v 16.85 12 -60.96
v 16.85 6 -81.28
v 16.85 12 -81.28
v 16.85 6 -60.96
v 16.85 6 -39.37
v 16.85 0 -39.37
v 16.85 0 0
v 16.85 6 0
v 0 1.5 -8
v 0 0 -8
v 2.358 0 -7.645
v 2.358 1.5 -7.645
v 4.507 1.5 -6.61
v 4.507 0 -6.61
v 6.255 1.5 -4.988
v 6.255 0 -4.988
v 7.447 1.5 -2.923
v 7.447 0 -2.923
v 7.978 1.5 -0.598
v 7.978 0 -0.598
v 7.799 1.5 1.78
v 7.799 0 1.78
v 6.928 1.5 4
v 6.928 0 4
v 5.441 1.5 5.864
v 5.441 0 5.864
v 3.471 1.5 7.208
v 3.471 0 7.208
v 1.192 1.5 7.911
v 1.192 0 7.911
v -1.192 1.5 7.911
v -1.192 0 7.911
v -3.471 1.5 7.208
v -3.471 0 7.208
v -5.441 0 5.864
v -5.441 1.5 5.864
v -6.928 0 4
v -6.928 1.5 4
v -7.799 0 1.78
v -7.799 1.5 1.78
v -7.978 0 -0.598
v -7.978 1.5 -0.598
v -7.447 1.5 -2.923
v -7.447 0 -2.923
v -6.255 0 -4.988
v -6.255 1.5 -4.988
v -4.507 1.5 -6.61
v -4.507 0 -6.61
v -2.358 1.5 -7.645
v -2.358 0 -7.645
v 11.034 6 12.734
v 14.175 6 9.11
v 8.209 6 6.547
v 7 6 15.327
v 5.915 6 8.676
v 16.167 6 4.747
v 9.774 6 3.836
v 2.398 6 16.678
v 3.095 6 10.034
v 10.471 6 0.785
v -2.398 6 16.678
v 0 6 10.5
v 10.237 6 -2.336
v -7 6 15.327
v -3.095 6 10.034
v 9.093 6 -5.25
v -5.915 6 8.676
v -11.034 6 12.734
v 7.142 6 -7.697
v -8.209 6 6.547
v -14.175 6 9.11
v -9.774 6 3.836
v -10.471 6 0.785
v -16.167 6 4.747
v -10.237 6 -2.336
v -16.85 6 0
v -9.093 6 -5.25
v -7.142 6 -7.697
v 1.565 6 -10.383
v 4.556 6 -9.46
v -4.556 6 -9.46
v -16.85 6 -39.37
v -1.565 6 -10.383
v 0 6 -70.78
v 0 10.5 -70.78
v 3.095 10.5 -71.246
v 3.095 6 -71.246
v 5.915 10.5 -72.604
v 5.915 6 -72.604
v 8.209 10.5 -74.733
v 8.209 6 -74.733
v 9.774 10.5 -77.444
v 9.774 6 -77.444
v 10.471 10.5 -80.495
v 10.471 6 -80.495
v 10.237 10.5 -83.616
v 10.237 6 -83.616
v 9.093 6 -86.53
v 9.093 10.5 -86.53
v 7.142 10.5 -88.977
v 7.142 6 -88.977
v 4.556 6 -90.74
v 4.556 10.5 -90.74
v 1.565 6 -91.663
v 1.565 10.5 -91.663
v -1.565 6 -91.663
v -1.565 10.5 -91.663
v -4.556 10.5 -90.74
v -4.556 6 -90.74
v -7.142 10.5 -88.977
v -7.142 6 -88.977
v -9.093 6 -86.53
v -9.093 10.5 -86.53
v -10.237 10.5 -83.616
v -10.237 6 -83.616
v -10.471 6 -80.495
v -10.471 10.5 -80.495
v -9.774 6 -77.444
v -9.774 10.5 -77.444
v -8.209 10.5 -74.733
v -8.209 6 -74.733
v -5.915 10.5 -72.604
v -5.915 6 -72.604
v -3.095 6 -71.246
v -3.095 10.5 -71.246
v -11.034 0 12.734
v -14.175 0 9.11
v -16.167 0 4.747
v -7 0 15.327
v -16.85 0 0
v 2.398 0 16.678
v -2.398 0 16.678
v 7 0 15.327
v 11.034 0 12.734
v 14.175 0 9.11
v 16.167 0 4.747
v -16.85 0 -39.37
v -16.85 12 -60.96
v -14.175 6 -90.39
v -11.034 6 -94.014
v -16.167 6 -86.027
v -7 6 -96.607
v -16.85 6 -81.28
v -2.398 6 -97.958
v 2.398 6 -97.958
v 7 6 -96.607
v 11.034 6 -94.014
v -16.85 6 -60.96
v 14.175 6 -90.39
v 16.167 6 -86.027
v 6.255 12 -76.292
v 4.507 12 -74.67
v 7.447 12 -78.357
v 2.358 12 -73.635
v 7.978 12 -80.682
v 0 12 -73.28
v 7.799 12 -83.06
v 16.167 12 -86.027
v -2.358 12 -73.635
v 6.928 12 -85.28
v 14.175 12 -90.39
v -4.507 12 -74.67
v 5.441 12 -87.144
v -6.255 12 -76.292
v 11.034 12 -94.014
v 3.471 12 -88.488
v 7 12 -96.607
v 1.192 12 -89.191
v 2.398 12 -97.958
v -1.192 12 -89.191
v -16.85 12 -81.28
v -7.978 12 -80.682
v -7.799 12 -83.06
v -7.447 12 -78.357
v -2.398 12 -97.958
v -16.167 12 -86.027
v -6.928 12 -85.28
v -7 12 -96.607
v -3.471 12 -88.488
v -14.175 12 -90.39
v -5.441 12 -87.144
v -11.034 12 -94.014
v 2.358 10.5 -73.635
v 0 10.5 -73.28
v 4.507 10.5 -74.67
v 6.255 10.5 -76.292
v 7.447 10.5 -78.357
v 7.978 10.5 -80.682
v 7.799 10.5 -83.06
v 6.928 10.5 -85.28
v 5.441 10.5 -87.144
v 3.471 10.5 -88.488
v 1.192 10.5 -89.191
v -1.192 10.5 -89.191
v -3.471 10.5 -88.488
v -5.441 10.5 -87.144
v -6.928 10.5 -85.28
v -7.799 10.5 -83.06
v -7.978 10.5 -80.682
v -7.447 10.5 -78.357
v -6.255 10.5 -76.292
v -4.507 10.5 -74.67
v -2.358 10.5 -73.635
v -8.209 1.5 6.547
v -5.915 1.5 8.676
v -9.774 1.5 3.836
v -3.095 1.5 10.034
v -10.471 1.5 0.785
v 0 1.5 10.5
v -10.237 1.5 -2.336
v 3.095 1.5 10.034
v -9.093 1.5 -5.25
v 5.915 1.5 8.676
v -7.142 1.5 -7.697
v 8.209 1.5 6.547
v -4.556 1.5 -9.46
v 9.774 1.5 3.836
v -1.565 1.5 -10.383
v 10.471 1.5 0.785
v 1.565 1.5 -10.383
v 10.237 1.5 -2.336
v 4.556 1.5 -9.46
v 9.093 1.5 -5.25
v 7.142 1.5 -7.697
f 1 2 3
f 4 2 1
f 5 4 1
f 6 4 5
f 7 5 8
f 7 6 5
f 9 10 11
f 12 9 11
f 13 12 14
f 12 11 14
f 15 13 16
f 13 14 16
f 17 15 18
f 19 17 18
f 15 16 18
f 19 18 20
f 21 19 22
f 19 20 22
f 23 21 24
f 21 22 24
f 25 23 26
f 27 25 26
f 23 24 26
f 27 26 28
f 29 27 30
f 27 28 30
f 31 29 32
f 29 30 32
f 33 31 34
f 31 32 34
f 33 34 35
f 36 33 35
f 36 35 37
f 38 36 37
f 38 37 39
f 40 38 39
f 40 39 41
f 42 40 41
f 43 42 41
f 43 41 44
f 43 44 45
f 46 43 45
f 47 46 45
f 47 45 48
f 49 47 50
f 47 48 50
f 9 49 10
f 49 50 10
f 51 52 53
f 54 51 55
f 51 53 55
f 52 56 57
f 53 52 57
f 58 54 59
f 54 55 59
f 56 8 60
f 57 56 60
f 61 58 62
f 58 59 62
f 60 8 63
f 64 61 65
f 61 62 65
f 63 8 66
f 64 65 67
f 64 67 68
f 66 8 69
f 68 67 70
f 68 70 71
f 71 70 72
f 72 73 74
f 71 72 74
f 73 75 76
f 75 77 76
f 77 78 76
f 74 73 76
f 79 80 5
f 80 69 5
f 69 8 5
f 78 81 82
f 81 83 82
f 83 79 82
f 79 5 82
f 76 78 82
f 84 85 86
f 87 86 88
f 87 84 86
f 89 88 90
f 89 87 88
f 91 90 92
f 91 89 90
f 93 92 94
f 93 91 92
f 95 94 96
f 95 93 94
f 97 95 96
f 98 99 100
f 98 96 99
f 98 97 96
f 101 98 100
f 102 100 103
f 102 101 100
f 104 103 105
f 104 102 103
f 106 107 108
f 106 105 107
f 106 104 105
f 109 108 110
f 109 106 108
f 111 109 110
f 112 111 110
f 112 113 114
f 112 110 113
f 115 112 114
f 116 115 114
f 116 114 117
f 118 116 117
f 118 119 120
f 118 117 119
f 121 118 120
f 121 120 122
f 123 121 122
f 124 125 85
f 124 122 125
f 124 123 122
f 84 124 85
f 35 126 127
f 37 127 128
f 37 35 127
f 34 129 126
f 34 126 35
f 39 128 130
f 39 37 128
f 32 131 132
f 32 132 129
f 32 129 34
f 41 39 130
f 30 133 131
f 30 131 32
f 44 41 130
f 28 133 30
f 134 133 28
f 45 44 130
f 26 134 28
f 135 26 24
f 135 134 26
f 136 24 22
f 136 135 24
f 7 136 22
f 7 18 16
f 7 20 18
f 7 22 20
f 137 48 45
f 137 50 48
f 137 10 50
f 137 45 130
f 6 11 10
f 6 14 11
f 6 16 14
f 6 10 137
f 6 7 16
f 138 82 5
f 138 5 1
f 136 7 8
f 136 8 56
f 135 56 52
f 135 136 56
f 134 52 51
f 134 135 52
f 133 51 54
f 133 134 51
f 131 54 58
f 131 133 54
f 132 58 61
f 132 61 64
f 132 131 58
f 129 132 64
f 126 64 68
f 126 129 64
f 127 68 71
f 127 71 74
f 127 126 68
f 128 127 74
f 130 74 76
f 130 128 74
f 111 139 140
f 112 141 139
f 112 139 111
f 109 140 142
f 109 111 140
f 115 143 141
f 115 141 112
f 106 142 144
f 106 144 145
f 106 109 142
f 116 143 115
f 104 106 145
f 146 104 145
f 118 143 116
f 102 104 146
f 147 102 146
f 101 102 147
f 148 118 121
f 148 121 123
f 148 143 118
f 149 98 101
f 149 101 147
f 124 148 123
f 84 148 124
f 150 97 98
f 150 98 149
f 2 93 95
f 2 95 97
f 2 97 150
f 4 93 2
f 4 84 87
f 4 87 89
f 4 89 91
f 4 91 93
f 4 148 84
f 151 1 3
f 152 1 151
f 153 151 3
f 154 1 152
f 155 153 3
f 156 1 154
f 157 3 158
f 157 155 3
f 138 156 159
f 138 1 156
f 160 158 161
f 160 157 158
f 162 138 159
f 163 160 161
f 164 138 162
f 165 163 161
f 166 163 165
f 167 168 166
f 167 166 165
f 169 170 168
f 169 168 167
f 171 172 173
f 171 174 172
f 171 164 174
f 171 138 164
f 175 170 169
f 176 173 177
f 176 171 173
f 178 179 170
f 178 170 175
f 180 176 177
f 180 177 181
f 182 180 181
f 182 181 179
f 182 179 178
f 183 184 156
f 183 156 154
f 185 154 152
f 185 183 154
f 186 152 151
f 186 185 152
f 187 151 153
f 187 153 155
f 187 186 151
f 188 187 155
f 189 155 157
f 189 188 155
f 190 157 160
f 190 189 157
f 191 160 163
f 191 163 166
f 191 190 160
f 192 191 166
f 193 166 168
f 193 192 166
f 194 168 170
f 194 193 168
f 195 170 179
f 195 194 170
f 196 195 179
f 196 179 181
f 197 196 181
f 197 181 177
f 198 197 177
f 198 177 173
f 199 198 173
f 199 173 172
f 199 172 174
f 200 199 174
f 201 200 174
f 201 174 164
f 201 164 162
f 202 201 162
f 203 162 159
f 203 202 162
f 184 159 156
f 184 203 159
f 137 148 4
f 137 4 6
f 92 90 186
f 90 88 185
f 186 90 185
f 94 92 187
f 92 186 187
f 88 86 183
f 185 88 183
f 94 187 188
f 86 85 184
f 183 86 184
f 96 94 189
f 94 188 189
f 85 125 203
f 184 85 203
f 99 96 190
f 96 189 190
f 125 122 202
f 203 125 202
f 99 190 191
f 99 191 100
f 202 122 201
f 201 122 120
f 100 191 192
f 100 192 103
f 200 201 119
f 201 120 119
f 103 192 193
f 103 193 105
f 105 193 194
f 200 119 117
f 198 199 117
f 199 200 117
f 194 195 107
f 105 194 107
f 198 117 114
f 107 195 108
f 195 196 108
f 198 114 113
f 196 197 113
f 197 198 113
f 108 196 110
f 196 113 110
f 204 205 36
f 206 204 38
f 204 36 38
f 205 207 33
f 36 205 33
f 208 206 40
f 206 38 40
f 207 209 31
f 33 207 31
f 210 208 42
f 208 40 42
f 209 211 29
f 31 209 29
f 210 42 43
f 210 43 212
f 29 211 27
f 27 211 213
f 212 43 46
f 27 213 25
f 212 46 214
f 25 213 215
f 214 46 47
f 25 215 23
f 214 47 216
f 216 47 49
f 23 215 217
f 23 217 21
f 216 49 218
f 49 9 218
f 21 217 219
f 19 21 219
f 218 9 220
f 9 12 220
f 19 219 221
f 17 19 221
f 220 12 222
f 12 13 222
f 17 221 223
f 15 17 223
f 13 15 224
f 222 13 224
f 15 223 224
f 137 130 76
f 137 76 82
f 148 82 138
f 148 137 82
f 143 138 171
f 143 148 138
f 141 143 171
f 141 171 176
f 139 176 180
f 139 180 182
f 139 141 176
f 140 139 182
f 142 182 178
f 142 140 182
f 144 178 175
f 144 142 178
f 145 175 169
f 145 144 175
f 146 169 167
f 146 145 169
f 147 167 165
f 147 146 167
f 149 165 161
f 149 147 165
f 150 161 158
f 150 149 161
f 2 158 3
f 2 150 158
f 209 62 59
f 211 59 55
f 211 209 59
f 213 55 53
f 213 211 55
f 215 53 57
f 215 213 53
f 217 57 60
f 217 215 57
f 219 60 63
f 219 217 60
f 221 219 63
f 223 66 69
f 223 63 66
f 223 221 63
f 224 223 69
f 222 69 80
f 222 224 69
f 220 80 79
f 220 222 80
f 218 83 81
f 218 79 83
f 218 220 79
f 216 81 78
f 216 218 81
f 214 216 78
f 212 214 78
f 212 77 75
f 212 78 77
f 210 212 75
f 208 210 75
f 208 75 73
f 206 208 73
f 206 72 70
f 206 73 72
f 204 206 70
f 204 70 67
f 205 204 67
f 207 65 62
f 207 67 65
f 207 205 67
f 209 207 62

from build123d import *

# Parameters (mm, degrees)
SKETCH1_R           = 10.499999955
BOSS_EXTRUDE1_DEPTH = 12
SKETCH2_R           = 10.499999955
CUT_EXTRUDE1_DEPTH  = 6
BOSS_EXTRUDE2_START = -1.5
SKETCH3_R           = 10.499999955
SKETCH3_R_2         = 8
BOSS_EXTRUDE2_DEPTH = 1.5
CUT_EXTRUDE2_START  = -6
CUT_EXTRUDE2_DEPTH  = 6
SKETCH5_R           = 10.499999955
SKETCH5_R_2         = 8
BOSS_EXTRUDE3_DEPTH = 1.5
CUT_EXTRUDE6_DEPTH  = 105.447053023


with BuildPart() as part:
    # Sketch1 → Boss-Extrude1 (new body)
    with BuildSketch(Plane(origin=(0, 0, 0), x_dir=(1, 0, 0), z_dir=(0, 1, 0))):
        with BuildLine():
            Line((-16.849999955, 0), (-16.849999955, 81.28))
            ThreePointArc((-16.849999955, 81.28), (0, 98.129999955), (16.849999955, 81.28))
            Line((16.849999955, 81.28), (16.849999955, 0))
            ThreePointArc((16.849999955, 0), (0, -16.849999955), (-16.849999955, 0))
        make_face()
        Circle(SKETCH1_R, mode=Mode.SUBTRACT)
        with Locations((0, 81.28)):
            Circle(SKETCH1_R, mode=Mode.SUBTRACT)
    extrude(amount=BOSS_EXTRUDE1_DEPTH)

    # Sketch2 → Cut-Extrude1 (cut)
    with BuildSketch(Plane.XZ):
        with BuildLine():
            Line((-16.849999955, -60.96), (-16.849999955, -81.28))
            ThreePointArc((-16.849999955, -81.28), (0, -98.129999955), (16.849999955, -81.28))
            Line((16.849999955, -81.28), (16.849999955, -60.96))
            Line((16.849999955, -60.96), (-16.849999955, -60.96))
        make_face()
        with Locations((0, -81.28)):
            Circle(SKETCH2_R, mode=Mode.SUBTRACT)
    extrude(amount=-CUT_EXTRUDE1_DEPTH, mode=Mode.SUBTRACT)

    # Sketch3 → Boss-Extrude2 (add)
    with BuildSketch(Plane(origin=(0, 12, 0), x_dir=(1, 0, 0), z_dir=(0, 1, 0)).offset(BOSS_EXTRUDE2_START)):
        with Locations((0, 81.28)):
            Circle(SKETCH3_R)
        with Locations((0, 81.28)):
            Circle(SKETCH3_R_2, mode=Mode.SUBTRACT)
    extrude(amount=BOSS_EXTRUDE2_DEPTH)

    # Sketch4 → Cut-Extrude2 (cut)
    with BuildSketch(Plane(origin=(0, 12, 0), x_dir=(1, 0, 0), z_dir=(0, 1, 0)).offset(CUT_EXTRUDE2_START)):
        with BuildLine():
            Line((-16.849999955, 0), (-16.849999955, 20.32))
            Line((-16.849999955, 20.32), (16.849999955, 20.32))
            Line((16.849999955, 20.32), (16.849999955, 0))
            ThreePointArc((16.849999955, 0), (0, -16.849999955), (-16.849999955, 0))
        make_face()
    extrude(amount=CUT_EXTRUDE2_DEPTH, mode=Mode.SUBTRACT)

    # Sketch5 → Boss-Extrude3 (add)
    with BuildSketch(Plane.XZ):
        Circle(SKETCH5_R)
        Circle(SKETCH5_R_2, mode=Mode.SUBTRACT)
    extrude(amount=-BOSS_EXTRUDE3_DEPTH)

    # Sketch8 → Cut-Extrude6 (cut, through all)
    with BuildSketch(Plane(origin=(-16.849999955, 0, 0), x_dir=(0, 0, -1), z_dir=(1, 0, 0))):
        Polygon((20.32, 6), (39.37, 6), (60.96, 12), (20.32, 12), align=None)
        Polygon((60.96, 6), (39.37, 0), (60.96, 0), align=None)
    extrude(amount=CUT_EXTRUDE6_DEPTH, mode=Mode.SUBTRACT)


solid = part.part
